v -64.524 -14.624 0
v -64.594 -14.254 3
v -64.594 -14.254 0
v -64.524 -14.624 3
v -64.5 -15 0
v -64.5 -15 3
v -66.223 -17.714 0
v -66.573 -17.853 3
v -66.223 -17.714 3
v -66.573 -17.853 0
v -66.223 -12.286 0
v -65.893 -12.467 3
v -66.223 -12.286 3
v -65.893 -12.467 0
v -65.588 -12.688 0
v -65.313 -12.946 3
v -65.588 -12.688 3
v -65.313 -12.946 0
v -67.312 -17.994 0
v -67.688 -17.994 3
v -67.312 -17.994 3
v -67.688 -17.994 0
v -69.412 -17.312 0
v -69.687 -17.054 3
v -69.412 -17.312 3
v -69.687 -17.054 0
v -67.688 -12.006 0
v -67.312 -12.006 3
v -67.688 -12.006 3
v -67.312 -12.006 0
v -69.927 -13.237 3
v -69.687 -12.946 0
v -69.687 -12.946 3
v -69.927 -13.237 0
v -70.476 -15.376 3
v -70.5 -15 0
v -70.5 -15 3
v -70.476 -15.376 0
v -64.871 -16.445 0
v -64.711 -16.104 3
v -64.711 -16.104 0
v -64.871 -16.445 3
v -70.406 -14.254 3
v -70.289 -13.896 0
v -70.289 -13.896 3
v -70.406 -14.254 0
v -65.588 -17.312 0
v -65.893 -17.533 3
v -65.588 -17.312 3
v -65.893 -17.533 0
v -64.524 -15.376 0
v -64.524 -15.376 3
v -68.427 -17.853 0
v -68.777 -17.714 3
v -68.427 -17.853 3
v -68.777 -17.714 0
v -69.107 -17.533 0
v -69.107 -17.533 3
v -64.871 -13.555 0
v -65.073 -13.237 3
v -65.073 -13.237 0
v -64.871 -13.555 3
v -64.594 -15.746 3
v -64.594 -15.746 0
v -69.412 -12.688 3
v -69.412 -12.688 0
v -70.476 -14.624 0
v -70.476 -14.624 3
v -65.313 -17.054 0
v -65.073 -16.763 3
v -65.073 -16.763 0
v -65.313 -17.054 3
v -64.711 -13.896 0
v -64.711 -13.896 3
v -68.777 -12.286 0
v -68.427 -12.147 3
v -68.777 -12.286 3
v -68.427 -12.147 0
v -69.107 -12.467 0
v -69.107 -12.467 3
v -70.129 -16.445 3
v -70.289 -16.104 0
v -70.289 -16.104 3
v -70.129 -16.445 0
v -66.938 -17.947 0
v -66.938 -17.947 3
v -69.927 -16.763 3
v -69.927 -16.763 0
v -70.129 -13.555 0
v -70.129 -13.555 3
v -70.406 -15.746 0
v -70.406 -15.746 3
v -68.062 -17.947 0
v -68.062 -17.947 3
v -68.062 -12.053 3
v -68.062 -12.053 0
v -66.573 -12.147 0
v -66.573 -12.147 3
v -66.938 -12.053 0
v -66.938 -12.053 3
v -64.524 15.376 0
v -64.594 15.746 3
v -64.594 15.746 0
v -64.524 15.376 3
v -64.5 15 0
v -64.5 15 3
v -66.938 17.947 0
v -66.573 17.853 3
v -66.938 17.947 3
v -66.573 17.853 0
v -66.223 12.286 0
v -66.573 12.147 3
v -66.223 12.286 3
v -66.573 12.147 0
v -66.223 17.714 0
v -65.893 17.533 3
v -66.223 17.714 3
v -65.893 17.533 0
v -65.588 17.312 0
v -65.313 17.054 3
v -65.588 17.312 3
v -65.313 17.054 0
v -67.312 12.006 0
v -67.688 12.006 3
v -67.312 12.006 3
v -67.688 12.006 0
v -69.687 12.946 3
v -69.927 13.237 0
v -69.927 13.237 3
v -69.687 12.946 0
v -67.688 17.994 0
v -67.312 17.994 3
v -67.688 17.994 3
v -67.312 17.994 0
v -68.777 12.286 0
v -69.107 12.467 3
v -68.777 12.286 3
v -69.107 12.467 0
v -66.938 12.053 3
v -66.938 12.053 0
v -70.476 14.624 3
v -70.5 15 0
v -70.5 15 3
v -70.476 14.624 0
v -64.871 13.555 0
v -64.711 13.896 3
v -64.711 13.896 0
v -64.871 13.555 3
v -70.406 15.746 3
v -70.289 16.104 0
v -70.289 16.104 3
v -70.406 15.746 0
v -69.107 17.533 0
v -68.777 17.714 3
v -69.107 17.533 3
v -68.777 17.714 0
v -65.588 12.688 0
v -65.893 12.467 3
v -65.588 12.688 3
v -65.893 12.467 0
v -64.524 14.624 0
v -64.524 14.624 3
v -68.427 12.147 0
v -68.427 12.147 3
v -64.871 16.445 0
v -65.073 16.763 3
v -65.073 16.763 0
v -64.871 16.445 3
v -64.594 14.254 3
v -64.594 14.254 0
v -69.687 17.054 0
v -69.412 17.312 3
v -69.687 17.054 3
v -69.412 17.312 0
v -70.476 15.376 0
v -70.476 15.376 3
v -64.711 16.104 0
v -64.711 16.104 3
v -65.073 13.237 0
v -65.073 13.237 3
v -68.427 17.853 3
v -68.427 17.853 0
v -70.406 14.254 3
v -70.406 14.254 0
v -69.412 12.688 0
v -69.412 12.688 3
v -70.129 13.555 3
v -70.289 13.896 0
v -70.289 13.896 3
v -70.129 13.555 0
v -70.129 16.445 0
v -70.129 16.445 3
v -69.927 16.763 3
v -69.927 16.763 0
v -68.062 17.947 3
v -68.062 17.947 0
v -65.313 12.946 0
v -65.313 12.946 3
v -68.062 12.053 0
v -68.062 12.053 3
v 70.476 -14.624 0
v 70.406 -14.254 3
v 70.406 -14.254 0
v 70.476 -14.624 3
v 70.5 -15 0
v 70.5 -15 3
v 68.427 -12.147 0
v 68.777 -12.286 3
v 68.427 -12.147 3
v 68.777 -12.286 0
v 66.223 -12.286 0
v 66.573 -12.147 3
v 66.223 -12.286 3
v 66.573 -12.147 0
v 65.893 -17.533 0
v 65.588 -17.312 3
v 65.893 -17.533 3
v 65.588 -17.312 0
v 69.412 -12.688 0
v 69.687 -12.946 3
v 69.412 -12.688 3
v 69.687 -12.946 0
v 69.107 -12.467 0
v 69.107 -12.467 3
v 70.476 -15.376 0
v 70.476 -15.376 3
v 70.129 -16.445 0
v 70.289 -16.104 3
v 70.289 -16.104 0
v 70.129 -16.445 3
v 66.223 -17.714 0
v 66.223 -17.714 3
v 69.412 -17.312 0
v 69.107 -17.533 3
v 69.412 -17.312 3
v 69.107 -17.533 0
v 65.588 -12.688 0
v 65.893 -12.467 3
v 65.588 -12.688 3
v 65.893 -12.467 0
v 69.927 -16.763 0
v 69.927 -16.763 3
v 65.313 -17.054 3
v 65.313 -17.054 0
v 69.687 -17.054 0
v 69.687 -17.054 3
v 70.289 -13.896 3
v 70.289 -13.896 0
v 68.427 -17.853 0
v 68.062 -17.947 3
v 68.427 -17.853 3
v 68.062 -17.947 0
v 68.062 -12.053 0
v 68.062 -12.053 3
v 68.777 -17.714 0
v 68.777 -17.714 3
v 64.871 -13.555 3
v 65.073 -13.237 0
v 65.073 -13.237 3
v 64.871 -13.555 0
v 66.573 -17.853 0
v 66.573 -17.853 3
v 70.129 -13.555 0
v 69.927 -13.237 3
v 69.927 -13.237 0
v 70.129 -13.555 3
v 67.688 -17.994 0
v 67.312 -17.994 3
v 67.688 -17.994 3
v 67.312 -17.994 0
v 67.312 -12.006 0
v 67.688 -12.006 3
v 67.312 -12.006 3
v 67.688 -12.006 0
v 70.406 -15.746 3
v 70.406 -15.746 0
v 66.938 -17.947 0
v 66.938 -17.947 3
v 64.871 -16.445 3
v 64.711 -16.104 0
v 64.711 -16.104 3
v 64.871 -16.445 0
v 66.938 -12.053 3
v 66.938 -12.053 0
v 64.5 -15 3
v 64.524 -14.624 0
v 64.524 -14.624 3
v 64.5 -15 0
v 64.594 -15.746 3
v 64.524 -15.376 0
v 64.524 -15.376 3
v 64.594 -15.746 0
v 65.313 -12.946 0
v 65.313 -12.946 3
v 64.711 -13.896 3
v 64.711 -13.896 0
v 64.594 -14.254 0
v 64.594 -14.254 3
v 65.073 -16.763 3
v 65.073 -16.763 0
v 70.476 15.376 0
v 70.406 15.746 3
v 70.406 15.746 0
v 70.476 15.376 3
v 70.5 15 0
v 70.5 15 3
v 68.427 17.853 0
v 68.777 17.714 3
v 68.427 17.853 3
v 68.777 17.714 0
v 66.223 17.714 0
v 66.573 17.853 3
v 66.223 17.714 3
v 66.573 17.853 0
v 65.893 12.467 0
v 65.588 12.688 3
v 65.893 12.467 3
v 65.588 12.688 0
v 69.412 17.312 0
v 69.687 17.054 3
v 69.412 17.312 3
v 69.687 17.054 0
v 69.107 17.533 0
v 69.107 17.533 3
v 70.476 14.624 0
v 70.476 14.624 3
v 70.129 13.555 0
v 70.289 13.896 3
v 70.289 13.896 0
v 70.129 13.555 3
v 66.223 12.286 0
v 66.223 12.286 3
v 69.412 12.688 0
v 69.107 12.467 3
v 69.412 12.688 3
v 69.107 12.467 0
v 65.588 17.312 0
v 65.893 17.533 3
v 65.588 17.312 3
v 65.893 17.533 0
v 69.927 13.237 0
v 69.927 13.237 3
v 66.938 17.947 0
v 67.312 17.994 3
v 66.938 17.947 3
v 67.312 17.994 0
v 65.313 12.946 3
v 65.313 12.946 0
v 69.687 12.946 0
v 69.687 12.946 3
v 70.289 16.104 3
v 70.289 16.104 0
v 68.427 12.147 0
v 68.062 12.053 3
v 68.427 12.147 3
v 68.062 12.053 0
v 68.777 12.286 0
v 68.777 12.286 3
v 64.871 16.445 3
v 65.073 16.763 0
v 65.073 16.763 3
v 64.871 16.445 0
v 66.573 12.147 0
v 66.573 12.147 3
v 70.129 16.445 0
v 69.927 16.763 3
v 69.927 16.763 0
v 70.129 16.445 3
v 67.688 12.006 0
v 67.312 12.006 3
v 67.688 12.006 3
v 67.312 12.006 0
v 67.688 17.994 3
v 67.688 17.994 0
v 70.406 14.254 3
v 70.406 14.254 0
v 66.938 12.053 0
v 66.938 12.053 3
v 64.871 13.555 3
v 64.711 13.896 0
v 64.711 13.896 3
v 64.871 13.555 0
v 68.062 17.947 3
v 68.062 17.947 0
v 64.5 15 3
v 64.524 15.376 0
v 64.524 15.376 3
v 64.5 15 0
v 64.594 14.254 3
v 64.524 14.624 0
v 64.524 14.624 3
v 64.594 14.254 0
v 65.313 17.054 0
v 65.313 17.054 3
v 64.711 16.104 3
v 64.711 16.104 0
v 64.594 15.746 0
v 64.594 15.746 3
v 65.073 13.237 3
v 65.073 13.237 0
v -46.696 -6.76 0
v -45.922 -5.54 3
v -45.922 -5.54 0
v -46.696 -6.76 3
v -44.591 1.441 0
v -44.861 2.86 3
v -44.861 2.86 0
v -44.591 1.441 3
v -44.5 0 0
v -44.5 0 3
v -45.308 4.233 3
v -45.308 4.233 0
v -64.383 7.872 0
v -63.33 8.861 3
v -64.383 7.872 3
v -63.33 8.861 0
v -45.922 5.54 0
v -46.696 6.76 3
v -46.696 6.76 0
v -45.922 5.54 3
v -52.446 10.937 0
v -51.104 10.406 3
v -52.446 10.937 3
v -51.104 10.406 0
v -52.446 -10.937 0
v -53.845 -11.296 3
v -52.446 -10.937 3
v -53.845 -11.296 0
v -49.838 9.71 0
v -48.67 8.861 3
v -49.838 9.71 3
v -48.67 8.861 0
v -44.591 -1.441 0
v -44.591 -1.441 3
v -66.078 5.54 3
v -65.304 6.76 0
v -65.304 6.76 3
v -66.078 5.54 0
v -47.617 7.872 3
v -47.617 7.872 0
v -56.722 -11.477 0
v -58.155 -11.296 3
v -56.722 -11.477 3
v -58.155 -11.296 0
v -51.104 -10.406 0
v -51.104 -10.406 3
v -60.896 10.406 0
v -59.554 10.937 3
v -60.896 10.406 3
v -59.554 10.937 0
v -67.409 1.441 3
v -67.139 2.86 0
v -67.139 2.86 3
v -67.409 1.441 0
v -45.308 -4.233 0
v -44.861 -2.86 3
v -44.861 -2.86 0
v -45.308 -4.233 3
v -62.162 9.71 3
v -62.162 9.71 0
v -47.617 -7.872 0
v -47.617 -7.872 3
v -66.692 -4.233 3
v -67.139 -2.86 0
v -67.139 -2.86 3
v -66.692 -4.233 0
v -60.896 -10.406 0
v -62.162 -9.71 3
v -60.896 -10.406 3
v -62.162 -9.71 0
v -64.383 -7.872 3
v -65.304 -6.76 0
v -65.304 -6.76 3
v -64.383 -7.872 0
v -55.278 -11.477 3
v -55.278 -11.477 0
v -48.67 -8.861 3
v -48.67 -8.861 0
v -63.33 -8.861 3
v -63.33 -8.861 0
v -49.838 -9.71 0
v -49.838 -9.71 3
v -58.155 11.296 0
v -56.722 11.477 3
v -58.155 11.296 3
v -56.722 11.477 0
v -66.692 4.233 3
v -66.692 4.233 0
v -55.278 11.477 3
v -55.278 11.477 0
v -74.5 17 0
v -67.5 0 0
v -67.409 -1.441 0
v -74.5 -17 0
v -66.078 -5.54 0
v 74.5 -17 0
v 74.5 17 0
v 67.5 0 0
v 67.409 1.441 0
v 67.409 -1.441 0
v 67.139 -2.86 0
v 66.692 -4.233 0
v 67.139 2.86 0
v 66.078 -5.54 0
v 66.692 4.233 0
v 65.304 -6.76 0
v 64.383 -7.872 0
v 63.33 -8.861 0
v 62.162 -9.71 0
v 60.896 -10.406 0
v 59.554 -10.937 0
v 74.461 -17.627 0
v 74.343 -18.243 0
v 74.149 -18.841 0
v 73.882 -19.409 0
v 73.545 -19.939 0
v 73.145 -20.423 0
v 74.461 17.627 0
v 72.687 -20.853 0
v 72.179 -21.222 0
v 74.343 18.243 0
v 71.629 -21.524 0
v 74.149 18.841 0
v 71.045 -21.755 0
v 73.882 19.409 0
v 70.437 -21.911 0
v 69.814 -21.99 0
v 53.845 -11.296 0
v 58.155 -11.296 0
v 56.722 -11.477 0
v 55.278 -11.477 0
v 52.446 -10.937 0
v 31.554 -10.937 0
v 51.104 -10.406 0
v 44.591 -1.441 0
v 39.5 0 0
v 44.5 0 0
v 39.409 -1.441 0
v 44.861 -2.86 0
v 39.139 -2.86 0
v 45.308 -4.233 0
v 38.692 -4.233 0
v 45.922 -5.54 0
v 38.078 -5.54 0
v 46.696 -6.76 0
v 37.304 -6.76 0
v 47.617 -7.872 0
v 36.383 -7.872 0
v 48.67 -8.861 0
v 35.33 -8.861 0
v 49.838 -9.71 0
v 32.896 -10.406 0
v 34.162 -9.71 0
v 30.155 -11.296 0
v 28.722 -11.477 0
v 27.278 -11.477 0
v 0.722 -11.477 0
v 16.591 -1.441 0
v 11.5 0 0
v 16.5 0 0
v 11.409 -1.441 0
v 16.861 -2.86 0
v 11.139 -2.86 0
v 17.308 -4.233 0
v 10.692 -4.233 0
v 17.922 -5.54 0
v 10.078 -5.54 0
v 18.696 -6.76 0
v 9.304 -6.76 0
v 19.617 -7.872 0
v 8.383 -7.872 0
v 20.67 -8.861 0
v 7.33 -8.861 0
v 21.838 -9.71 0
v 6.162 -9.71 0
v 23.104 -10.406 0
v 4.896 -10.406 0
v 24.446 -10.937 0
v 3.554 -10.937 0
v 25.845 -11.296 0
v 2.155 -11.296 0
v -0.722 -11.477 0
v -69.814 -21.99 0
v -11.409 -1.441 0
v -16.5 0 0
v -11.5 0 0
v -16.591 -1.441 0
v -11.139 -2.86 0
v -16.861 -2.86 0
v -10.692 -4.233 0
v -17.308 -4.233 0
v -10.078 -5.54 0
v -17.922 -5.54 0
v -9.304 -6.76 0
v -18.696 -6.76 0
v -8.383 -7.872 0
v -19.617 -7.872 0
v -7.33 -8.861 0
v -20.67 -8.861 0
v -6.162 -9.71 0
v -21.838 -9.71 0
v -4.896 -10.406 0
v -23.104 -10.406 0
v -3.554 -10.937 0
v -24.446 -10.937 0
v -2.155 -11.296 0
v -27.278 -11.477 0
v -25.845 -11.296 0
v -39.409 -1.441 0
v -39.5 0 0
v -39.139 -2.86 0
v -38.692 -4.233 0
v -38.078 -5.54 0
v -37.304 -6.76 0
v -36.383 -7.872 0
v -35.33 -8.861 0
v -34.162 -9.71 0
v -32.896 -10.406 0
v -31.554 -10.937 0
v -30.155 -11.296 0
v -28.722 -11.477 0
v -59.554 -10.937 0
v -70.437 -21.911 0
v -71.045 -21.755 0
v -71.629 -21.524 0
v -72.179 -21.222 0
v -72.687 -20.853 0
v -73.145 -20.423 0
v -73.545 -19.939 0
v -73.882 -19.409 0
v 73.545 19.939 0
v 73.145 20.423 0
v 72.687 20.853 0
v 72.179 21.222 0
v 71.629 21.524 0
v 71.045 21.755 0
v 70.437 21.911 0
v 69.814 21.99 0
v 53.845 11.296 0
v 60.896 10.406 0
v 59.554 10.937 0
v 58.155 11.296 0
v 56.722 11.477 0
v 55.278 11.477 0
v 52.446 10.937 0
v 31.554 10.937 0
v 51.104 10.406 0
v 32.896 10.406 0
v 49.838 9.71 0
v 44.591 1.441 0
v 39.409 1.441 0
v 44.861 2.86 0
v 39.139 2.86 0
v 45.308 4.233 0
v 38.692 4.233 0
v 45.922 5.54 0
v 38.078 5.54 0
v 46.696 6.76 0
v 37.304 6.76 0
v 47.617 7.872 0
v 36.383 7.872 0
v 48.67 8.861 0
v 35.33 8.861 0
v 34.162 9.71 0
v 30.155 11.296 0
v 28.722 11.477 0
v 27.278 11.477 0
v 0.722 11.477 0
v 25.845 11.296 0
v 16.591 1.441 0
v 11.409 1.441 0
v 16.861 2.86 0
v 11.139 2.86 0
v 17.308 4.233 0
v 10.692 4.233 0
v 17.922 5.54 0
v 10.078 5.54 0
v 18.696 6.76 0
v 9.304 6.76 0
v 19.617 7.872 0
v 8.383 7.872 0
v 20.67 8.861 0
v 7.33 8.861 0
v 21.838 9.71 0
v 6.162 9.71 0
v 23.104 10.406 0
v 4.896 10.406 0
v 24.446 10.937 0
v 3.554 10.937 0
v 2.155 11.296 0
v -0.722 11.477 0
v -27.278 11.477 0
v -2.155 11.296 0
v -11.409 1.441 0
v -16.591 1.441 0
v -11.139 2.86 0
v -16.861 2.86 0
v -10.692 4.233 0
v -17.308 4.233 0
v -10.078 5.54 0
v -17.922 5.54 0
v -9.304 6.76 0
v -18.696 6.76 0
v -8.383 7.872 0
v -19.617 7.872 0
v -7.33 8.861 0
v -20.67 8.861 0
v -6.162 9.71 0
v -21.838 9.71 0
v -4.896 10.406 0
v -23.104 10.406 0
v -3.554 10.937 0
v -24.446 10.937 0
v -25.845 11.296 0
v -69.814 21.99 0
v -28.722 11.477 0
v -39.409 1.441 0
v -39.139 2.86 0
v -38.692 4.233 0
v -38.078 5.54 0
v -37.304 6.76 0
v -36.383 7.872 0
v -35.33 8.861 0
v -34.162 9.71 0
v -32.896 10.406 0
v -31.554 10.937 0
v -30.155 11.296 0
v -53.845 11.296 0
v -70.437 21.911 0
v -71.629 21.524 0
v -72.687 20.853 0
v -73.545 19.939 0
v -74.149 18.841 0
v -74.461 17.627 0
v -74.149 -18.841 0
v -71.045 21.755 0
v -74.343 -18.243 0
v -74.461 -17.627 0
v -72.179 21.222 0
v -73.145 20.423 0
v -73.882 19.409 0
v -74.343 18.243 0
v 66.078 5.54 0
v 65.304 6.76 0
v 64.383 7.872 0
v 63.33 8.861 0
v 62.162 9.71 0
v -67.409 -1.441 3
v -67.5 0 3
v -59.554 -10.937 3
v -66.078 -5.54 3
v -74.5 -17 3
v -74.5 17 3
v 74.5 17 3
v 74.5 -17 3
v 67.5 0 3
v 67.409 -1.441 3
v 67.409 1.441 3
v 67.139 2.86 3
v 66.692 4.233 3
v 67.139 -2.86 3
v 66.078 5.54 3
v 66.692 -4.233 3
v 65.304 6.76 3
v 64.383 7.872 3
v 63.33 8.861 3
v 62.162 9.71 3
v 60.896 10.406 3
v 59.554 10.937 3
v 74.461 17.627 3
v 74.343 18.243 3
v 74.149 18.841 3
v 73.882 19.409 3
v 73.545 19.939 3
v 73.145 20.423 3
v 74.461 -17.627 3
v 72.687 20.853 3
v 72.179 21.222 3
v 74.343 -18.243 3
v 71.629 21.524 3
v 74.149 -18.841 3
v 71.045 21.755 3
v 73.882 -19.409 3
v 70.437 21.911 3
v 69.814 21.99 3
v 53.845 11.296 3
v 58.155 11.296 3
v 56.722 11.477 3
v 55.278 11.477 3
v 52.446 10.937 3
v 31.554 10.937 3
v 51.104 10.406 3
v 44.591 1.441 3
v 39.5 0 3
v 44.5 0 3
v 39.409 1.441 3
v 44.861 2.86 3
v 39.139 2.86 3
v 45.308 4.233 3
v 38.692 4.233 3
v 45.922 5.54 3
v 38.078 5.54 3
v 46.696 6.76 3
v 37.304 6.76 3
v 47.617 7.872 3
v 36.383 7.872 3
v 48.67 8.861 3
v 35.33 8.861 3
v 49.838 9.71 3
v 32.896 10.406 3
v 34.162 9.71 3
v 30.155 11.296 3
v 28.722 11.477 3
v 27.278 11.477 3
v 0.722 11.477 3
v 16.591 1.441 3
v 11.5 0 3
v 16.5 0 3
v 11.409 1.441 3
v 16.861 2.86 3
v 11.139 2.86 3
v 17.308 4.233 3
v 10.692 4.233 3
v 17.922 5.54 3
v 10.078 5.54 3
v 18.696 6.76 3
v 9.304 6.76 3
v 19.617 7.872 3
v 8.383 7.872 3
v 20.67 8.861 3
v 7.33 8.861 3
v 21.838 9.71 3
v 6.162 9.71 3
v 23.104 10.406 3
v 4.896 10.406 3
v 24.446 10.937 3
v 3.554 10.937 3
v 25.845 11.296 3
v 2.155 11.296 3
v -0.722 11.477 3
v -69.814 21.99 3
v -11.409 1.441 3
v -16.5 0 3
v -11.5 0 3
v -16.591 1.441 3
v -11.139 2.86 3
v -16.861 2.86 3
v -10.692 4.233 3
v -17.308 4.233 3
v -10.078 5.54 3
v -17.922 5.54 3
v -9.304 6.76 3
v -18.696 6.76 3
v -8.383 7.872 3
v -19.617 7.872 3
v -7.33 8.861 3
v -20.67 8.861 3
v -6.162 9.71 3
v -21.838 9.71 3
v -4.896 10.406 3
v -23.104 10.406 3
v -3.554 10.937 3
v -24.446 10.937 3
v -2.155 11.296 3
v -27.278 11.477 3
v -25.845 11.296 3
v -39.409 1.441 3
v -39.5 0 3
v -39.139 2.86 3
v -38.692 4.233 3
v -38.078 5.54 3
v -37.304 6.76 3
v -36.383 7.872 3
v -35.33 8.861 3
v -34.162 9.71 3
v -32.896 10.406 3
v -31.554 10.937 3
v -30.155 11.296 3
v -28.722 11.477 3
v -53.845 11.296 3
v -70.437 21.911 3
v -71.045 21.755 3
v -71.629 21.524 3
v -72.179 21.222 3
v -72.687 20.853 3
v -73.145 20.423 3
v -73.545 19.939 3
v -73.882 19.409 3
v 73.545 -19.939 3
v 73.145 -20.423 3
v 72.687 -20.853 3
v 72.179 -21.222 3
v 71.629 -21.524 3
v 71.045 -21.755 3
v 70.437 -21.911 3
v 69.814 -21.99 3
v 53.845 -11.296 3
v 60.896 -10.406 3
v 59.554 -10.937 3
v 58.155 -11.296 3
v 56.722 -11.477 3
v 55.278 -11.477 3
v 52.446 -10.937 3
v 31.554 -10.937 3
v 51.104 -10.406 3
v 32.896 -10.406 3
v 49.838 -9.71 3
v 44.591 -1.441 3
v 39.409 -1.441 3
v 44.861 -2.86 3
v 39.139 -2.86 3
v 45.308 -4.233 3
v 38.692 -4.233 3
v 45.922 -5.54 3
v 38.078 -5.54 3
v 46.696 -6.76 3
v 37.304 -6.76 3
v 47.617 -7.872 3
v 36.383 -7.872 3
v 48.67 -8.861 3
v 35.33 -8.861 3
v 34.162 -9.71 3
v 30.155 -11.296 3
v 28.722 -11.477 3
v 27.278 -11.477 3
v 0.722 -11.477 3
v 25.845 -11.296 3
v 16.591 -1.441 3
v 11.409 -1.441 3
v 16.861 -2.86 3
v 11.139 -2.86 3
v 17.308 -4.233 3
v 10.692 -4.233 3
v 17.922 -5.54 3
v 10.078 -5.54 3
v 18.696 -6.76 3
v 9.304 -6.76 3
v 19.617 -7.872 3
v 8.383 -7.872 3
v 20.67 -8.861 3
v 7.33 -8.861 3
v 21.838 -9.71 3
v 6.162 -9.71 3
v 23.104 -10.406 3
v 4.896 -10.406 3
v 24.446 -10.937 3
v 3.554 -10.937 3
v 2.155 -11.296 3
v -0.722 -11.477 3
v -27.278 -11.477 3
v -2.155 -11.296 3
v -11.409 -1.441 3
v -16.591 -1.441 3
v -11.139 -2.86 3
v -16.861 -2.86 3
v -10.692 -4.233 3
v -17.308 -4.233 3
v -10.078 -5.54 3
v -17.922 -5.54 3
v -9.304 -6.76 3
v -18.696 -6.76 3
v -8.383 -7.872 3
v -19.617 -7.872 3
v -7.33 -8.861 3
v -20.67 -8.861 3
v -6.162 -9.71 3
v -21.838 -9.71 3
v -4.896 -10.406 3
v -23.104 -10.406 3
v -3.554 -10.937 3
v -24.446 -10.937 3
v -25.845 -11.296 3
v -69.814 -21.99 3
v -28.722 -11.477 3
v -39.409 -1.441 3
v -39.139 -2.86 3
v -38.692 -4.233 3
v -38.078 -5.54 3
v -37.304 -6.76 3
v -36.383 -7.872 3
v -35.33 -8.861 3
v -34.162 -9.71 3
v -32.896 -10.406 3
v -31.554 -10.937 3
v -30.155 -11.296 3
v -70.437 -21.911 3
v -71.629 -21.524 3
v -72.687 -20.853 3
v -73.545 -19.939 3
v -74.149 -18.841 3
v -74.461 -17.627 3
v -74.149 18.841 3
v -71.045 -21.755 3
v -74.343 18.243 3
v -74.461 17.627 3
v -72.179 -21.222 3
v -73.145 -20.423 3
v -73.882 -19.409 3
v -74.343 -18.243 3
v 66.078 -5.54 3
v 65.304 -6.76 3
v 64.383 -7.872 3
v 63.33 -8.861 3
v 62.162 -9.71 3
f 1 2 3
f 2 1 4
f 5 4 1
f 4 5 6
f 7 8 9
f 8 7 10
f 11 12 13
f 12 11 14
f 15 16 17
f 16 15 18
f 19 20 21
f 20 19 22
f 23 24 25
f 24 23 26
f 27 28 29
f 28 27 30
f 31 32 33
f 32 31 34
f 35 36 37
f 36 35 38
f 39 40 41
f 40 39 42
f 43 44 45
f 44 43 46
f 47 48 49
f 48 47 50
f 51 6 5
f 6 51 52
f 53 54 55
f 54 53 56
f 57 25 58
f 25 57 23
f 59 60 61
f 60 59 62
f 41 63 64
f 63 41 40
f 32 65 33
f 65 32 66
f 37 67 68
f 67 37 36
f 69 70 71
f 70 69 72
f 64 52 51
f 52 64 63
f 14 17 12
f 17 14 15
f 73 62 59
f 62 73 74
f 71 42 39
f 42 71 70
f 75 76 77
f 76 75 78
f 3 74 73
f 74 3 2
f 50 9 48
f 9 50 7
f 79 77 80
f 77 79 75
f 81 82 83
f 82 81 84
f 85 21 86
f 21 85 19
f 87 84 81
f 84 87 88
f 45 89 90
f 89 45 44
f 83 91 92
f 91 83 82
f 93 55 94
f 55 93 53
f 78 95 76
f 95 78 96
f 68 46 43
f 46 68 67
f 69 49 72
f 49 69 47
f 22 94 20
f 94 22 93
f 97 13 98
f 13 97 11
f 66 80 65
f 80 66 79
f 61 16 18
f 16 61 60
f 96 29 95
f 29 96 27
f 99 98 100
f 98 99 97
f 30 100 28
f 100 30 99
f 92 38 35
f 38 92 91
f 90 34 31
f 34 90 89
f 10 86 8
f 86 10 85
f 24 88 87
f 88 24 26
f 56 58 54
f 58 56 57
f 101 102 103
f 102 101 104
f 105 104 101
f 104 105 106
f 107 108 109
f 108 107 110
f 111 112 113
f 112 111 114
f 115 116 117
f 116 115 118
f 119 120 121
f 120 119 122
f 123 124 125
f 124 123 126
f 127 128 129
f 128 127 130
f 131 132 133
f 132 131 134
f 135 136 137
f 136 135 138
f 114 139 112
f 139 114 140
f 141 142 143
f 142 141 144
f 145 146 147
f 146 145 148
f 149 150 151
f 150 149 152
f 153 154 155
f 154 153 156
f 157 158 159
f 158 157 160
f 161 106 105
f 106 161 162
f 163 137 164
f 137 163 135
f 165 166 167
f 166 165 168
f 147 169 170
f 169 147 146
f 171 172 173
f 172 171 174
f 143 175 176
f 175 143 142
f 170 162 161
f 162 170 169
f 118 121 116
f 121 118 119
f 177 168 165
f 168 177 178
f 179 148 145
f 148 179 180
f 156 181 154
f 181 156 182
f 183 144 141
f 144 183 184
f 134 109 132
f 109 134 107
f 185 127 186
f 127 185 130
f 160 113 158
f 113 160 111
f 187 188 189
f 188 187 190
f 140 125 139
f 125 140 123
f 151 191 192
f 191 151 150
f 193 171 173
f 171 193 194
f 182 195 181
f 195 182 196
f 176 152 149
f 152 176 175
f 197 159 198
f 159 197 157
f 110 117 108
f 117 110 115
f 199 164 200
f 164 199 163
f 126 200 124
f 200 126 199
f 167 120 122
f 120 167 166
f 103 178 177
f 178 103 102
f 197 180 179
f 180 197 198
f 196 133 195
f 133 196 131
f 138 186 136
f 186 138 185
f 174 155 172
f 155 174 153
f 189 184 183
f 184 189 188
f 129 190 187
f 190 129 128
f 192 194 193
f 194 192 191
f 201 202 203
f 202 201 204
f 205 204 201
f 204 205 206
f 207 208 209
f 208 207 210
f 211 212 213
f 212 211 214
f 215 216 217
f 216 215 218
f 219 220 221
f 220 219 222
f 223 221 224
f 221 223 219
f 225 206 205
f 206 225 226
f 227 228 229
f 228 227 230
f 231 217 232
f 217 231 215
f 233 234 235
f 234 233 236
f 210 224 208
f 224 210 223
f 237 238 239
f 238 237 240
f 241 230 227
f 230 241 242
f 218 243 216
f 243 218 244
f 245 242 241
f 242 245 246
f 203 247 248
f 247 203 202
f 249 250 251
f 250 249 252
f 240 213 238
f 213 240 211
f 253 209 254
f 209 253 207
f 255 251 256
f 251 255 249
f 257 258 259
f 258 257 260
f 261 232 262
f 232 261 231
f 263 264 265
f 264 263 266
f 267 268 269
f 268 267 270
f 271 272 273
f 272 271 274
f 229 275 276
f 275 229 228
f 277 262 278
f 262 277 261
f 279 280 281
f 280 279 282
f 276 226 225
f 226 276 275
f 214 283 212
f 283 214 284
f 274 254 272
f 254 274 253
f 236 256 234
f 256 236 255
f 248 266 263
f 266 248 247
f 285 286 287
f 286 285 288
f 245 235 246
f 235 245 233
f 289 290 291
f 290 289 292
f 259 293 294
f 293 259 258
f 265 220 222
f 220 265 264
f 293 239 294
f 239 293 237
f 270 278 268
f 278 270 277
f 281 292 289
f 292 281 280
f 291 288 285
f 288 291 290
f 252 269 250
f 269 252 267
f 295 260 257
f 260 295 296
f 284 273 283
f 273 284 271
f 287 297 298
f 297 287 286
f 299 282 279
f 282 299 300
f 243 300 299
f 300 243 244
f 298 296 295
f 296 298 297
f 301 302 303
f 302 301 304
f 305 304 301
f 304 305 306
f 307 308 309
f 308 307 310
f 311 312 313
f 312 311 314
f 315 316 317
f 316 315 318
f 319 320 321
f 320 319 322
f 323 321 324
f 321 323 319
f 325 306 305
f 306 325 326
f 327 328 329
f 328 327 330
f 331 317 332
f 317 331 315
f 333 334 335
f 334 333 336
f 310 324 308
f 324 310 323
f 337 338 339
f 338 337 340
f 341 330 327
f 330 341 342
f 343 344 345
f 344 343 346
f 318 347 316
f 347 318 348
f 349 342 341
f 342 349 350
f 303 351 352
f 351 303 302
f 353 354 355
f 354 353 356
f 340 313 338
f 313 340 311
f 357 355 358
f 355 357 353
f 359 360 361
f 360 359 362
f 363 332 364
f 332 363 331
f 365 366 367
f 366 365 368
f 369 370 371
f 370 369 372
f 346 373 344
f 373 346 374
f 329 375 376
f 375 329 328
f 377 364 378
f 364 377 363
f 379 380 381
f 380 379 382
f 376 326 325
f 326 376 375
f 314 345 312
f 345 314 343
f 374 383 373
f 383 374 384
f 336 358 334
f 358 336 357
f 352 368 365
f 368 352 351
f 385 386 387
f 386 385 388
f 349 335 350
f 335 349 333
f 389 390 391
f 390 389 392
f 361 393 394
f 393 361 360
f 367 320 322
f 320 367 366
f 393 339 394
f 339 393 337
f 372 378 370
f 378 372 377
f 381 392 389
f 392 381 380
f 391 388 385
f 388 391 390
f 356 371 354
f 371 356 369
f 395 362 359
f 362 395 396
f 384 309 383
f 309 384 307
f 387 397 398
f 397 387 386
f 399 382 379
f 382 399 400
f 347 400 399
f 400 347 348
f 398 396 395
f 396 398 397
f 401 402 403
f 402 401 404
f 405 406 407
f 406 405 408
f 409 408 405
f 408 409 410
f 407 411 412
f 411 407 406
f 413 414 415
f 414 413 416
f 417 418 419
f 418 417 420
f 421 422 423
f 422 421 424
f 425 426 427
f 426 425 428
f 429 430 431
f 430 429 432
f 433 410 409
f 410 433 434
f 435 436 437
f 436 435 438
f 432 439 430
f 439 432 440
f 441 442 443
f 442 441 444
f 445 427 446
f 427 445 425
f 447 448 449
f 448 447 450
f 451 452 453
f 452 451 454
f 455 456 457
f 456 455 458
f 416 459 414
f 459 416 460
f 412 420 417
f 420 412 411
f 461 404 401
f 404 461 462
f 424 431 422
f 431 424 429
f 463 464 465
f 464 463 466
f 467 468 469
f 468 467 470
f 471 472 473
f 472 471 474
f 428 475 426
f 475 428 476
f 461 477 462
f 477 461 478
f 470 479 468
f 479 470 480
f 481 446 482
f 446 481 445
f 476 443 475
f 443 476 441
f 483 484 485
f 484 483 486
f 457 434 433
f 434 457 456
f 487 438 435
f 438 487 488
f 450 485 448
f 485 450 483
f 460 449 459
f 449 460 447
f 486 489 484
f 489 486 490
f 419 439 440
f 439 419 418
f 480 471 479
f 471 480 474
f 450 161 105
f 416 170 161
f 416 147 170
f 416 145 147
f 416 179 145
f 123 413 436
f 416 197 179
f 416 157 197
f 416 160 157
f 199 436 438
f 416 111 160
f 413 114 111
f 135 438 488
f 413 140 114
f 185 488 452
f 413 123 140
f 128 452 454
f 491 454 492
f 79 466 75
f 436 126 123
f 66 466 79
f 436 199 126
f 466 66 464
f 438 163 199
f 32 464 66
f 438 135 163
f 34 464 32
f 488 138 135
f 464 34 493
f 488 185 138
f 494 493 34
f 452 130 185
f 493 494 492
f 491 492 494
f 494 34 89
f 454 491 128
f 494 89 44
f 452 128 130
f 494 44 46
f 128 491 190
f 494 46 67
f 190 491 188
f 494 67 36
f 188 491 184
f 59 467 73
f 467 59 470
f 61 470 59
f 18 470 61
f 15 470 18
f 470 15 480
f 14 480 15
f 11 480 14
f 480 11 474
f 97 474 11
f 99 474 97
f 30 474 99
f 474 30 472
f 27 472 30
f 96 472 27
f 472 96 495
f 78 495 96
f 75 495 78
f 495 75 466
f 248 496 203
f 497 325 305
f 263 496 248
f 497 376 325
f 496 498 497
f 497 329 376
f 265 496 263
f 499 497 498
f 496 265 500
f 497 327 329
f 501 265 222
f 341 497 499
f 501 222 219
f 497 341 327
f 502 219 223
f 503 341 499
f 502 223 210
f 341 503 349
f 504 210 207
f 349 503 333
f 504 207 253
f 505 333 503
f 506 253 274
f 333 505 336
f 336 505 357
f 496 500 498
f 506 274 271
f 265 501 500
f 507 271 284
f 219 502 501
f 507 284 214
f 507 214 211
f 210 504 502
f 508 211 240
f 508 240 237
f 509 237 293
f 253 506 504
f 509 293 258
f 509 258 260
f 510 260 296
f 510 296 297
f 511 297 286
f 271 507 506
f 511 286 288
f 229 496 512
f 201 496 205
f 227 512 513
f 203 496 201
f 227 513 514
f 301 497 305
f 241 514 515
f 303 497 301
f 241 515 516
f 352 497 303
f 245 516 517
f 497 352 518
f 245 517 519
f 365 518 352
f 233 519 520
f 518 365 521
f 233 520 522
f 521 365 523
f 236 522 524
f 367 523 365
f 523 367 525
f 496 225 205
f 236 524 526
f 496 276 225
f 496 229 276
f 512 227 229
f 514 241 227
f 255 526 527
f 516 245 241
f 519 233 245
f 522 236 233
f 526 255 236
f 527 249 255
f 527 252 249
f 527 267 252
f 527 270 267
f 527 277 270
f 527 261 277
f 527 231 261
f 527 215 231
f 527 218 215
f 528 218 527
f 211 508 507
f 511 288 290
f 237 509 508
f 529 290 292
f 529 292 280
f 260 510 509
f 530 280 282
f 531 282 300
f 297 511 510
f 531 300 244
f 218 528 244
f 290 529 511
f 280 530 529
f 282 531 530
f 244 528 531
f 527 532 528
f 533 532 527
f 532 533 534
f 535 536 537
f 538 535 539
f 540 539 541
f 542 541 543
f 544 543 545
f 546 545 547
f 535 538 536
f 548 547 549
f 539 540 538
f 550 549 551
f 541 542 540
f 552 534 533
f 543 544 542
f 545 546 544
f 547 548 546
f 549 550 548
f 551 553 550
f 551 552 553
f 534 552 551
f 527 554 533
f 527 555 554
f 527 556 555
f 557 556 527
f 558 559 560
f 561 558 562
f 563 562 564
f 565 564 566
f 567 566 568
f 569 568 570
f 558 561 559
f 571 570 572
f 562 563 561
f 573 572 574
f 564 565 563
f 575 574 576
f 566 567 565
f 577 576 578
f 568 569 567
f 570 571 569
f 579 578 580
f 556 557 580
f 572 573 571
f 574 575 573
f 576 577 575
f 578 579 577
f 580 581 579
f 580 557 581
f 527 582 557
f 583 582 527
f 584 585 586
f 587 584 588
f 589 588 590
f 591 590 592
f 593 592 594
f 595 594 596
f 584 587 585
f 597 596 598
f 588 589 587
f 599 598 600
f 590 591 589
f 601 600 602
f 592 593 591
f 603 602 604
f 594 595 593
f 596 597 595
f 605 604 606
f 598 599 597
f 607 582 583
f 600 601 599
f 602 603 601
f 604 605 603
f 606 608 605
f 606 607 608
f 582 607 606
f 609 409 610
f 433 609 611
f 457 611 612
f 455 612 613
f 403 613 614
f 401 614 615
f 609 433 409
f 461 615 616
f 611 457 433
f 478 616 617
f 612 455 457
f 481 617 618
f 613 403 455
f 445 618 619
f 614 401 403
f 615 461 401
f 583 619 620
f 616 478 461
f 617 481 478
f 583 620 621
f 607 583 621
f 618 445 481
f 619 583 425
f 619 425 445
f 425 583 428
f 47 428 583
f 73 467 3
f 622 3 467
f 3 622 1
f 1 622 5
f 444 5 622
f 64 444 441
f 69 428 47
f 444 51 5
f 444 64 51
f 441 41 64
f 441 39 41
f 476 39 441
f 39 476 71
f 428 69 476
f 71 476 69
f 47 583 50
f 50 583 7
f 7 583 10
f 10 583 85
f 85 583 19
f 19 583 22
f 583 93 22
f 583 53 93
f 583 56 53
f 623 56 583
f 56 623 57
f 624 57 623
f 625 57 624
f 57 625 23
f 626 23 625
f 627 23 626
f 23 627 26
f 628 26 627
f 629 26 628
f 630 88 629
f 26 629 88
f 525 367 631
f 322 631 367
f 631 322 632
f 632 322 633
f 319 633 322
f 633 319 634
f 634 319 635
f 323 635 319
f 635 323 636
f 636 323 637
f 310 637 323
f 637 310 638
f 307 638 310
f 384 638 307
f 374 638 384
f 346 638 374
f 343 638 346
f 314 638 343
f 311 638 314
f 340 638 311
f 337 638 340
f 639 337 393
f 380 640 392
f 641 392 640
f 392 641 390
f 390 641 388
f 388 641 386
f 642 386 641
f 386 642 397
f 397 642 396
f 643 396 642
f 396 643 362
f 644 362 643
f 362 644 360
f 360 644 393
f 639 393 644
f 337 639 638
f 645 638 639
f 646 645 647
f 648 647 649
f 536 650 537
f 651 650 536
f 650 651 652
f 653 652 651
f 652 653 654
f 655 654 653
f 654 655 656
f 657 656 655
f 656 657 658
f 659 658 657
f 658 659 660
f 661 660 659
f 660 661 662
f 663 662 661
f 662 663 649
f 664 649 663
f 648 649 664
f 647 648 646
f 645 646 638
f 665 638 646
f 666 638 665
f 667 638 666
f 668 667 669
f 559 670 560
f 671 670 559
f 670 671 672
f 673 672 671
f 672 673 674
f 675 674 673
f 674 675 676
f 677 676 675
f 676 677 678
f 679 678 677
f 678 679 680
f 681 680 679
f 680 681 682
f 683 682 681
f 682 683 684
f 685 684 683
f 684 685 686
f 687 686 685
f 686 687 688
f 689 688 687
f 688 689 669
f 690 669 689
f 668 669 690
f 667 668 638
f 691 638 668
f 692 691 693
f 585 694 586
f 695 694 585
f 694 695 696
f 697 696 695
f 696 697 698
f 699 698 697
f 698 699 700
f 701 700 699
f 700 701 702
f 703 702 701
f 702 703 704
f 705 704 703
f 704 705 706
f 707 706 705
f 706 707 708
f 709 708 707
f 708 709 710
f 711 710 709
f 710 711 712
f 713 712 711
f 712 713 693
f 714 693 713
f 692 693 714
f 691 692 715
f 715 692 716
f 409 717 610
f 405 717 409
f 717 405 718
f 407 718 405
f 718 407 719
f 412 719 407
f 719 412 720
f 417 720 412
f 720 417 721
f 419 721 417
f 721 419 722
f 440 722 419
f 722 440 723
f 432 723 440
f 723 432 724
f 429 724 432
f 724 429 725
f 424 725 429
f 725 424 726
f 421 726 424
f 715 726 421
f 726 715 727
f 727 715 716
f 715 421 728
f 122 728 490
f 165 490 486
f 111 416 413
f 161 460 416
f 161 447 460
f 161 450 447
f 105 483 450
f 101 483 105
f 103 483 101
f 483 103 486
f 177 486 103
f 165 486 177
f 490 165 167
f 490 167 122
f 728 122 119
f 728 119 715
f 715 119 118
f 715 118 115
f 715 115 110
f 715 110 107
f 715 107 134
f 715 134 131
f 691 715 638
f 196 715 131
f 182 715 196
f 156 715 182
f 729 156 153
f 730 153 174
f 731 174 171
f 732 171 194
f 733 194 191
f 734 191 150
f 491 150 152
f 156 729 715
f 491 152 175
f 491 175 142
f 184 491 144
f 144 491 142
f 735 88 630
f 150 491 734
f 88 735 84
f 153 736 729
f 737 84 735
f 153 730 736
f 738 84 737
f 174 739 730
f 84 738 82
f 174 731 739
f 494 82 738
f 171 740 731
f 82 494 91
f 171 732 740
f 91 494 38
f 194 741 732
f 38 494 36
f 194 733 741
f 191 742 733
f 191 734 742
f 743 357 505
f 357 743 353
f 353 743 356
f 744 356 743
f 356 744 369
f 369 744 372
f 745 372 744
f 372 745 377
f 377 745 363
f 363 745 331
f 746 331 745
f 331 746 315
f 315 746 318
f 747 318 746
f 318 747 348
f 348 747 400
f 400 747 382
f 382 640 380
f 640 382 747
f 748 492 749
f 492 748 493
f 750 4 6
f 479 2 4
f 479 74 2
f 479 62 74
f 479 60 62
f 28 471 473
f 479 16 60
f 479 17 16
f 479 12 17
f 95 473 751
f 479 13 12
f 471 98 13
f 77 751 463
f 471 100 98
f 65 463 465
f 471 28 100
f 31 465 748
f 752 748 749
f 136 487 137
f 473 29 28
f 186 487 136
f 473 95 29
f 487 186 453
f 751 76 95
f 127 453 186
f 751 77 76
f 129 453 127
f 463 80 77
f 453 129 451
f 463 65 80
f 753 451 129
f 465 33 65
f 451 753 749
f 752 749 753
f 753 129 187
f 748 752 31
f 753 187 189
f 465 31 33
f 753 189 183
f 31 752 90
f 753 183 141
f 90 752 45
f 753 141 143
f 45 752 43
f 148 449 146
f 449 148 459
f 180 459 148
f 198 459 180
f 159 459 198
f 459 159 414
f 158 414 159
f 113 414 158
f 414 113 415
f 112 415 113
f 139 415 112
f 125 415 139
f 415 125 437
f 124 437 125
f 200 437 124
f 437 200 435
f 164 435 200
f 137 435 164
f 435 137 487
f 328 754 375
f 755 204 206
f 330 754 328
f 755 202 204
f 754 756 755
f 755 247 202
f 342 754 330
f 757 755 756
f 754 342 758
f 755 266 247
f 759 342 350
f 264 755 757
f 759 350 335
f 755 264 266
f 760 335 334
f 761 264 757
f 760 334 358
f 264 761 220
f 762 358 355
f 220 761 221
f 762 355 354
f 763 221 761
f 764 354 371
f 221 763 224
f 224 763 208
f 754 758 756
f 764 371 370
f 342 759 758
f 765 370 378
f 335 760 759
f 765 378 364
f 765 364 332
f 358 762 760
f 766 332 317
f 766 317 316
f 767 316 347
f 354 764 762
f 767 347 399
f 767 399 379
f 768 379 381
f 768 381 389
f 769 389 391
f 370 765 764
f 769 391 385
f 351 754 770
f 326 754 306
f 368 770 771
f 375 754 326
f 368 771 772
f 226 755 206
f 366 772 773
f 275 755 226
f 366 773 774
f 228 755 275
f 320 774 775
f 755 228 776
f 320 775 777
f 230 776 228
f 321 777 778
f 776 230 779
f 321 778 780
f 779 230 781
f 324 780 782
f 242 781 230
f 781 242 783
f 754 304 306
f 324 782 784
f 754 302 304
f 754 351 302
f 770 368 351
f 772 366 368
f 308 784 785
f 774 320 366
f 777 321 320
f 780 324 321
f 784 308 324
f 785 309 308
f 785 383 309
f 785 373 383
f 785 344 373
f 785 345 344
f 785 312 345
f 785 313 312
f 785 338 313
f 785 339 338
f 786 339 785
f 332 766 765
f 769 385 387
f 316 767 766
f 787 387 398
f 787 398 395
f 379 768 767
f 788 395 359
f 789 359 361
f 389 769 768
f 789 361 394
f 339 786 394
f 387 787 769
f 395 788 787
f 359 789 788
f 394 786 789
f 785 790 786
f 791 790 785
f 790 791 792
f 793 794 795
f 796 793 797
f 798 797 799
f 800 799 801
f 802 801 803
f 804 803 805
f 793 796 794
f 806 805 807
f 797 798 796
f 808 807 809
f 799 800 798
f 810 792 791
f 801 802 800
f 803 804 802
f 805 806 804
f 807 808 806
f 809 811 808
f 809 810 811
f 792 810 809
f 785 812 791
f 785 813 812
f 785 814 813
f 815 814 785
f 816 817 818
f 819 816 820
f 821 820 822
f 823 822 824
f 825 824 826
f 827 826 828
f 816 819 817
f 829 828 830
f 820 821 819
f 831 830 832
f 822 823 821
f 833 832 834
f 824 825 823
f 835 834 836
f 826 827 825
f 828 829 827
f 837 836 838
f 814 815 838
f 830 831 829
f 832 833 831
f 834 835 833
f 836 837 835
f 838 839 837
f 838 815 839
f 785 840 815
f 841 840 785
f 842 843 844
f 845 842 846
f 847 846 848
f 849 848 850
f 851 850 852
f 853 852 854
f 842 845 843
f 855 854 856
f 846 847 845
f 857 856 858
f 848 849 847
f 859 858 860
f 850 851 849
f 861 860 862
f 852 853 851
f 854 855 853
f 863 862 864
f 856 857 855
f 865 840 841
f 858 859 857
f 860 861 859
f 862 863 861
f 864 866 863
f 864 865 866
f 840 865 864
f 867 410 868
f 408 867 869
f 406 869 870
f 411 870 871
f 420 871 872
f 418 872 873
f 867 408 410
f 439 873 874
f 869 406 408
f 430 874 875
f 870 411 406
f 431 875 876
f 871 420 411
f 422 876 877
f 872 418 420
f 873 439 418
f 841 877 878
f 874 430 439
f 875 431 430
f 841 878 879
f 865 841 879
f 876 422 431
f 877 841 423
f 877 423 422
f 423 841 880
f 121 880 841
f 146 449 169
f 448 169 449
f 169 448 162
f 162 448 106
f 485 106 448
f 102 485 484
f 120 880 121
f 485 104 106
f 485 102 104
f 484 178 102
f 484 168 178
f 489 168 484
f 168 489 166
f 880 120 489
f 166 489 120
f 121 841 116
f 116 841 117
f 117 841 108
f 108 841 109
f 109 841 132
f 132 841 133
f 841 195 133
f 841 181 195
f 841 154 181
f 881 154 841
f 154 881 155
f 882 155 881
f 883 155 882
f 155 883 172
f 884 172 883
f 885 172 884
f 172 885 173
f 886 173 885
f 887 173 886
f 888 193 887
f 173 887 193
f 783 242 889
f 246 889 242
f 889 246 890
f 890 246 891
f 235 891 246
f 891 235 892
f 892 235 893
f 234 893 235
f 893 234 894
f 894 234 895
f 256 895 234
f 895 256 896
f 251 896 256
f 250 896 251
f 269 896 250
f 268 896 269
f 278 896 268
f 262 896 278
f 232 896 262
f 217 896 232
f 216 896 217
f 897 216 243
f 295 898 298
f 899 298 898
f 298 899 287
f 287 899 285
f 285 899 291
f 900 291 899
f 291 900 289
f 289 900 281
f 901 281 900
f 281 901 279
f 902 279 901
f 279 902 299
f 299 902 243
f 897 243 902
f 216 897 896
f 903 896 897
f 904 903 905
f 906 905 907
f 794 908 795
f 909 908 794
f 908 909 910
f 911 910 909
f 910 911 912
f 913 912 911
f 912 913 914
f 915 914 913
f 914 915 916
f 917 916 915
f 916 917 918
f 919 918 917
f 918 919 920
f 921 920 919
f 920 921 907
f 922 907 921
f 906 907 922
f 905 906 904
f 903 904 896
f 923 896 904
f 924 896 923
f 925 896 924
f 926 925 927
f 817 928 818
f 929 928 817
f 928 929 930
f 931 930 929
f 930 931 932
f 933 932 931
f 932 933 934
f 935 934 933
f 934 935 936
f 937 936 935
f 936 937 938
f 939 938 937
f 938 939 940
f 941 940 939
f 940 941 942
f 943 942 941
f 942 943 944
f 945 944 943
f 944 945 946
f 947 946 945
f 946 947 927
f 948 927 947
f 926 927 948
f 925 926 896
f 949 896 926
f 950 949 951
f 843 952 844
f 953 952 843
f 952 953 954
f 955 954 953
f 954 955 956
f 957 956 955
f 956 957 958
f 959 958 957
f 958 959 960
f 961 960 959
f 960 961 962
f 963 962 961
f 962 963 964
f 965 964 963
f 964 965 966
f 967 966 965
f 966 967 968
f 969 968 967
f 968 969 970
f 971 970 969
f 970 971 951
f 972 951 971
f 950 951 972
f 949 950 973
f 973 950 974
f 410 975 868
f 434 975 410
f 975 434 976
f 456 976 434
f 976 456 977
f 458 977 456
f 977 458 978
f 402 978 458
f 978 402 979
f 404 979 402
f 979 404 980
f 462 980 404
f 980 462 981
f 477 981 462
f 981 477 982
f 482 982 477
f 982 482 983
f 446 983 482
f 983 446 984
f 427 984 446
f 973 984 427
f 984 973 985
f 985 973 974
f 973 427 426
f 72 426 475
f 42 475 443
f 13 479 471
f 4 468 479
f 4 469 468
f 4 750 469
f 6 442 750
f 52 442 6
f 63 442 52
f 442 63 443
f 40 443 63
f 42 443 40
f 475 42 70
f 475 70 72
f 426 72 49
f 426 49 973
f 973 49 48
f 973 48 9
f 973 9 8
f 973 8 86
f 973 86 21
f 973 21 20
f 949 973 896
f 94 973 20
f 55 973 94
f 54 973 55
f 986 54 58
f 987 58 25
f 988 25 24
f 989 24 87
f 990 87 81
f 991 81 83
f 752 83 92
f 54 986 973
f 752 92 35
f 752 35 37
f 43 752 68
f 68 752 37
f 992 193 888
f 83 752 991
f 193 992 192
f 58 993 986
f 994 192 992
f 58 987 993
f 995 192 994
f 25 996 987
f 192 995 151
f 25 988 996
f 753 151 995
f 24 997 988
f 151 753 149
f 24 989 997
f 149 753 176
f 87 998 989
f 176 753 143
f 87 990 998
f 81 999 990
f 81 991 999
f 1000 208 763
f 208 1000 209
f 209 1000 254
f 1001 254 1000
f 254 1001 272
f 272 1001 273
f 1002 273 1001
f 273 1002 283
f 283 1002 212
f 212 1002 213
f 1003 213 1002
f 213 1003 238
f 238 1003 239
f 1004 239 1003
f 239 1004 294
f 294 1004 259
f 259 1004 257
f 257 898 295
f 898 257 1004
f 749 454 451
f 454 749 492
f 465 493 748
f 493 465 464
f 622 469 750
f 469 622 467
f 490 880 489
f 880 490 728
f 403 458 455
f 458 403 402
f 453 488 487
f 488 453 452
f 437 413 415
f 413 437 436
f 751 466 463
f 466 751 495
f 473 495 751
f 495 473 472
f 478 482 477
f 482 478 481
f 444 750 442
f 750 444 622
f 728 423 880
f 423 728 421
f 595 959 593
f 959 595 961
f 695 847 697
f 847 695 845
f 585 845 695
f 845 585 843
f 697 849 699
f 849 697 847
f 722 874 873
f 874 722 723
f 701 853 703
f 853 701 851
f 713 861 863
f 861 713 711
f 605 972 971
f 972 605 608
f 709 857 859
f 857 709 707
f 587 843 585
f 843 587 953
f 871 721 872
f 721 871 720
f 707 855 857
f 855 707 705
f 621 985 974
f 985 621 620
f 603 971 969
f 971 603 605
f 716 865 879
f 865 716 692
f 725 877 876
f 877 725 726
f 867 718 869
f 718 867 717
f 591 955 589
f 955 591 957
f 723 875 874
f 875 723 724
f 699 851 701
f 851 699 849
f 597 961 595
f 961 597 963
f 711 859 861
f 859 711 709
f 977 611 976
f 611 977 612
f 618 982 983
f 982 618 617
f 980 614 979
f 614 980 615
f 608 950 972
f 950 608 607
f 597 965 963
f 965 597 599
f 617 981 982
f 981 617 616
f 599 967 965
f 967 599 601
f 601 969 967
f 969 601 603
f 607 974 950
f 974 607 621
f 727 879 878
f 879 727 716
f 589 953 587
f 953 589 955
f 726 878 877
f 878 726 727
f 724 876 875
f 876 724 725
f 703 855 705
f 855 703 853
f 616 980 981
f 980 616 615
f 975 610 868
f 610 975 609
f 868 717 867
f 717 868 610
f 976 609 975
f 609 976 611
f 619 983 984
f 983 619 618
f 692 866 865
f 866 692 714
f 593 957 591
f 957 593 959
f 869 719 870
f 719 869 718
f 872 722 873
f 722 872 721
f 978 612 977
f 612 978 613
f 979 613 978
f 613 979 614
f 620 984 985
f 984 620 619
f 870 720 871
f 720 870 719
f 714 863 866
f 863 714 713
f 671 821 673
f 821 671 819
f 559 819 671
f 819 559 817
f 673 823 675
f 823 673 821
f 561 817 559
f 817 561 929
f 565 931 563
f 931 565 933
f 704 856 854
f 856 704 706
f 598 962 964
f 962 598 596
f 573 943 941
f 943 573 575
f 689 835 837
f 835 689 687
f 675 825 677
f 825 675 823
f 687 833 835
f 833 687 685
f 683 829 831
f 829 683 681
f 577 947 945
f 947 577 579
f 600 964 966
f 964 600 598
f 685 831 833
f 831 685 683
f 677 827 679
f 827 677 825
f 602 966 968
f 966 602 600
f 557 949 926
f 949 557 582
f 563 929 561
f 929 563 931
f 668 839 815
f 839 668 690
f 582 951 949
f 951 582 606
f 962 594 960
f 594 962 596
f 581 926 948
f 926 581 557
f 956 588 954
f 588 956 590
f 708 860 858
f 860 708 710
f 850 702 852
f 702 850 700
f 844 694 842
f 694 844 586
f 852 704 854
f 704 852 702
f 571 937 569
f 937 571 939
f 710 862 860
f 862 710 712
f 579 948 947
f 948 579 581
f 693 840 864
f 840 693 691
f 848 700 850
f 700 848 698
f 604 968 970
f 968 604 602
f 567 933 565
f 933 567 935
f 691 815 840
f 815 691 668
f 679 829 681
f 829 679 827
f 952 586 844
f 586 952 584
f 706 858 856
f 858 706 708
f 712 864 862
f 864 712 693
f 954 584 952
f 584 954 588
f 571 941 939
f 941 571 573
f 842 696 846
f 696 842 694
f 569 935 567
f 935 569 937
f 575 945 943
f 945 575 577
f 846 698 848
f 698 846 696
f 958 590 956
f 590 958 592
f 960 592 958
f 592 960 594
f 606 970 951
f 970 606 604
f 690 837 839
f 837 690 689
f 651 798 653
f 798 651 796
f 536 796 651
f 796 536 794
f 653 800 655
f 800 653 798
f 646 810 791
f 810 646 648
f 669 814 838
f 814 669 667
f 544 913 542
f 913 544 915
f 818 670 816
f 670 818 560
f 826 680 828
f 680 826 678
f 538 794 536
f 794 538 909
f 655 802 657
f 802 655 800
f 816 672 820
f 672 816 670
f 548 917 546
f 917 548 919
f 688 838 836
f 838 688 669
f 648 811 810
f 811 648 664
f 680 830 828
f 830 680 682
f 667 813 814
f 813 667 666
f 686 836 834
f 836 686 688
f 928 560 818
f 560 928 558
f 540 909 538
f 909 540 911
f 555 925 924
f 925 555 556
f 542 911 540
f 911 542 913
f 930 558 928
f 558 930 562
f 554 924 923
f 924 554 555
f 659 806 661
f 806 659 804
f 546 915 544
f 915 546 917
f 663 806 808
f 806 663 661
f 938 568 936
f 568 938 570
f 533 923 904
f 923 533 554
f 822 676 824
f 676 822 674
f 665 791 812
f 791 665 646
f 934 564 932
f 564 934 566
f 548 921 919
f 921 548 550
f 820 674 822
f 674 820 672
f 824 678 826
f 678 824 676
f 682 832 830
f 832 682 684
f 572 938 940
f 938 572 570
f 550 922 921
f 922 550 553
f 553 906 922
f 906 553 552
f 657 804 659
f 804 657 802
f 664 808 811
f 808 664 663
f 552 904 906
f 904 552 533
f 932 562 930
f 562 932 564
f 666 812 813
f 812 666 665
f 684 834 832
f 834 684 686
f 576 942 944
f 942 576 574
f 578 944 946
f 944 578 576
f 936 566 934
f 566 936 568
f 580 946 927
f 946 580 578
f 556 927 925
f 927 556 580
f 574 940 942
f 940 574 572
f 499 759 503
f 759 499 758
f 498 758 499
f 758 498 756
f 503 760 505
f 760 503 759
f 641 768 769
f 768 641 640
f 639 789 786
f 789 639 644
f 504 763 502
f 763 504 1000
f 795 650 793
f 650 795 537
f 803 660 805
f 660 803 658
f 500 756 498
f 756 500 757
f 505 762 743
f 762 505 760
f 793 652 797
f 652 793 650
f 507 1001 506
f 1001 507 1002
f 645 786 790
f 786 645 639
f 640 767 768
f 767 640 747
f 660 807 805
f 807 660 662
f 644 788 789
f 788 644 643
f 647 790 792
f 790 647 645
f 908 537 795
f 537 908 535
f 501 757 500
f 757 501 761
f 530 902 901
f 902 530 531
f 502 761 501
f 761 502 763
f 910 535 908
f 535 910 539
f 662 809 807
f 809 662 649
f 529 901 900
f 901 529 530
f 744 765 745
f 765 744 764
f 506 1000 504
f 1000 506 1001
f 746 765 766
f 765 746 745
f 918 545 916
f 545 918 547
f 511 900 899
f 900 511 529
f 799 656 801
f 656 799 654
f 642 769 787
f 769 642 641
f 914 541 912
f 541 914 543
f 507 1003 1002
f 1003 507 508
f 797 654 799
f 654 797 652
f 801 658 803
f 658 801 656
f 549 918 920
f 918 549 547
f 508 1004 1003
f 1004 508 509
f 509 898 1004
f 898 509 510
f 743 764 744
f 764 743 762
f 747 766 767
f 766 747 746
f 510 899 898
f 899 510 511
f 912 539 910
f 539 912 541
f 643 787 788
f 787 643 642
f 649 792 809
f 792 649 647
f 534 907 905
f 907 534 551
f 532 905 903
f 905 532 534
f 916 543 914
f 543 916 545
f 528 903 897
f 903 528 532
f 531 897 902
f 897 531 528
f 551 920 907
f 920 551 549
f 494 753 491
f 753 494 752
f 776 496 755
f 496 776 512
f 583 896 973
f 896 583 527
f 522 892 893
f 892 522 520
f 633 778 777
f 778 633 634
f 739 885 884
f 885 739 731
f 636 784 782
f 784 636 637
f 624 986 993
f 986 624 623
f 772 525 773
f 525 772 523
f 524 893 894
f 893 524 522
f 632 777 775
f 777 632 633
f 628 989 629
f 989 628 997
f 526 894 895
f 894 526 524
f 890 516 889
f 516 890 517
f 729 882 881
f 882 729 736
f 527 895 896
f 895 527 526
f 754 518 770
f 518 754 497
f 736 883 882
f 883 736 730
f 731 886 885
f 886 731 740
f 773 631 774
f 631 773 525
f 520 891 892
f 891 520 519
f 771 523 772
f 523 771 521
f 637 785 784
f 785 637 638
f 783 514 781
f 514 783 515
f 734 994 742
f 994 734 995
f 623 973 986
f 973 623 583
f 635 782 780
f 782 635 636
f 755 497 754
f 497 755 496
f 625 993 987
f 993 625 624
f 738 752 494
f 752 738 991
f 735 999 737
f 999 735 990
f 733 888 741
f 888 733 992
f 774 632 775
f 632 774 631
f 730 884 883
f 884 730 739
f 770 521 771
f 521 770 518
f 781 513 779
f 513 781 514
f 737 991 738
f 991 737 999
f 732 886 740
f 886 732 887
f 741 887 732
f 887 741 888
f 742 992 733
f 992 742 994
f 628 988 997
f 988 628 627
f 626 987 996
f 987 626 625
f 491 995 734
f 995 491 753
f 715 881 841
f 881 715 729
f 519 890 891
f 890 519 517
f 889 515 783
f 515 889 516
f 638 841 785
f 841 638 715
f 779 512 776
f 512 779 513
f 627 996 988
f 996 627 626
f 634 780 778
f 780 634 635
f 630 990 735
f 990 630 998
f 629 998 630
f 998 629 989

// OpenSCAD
$fn = 50;


difference() {
	union() {
		hull() {
			translate(v = [-69.5000000000, 17.0000000000, 0]) {
				cylinder(h = 3, r = 5);
			}
			translate(v = [69.5000000000, 17.0000000000, 0]) {
				cylinder(h = 3, r = 5);
			}
			translate(v = [-69.5000000000, -17.0000000000, 0]) {
				cylinder(h = 3, r = 5);
			}
			translate(v = [69.5000000000, -17.0000000000, 0]) {
				cylinder(h = 3, r = 5);
			}
		}
	}
	union() {
		#translate(v = [-67.5000000000, -15.0000000000, -100.0000000000]) {
			cylinder(h = 200, r = 3.0000000000);
		}
		#translate(v = [-67.5000000000, 15.0000000000, -100.0000000000]) {
			cylinder(h = 200, r = 3.0000000000);
		}
		#translate(v = [67.5000000000, -15.0000000000, -100.0000000000]) {
			cylinder(h = 200, r = 3.0000000000);
		}
		#translate(v = [67.5000000000, 15.0000000000, -100.0000000000]) {
			cylinder(h = 200, r = 3.0000000000);
		}
		#translate(v = [-56.0000000000, 0, 0]) {
			cylinder(h = 3, r = 11.5000000000);
		}
		#translate(v = [-28.0000000000, 0, 0]) {
			cylinder(h = 3, r = 11.5000000000);
		}
		#cylinder(h = 3, r = 11.5000000000);
		#translate(v = [28.0000000000, 0, 0]) {
			cylinder(h = 3, r = 11.5000000000);
		}
		#translate(v = [56.0000000000, 0, 0]) {
			cylinder(h = 3, r = 11.5000000000);
		}
	}
}
